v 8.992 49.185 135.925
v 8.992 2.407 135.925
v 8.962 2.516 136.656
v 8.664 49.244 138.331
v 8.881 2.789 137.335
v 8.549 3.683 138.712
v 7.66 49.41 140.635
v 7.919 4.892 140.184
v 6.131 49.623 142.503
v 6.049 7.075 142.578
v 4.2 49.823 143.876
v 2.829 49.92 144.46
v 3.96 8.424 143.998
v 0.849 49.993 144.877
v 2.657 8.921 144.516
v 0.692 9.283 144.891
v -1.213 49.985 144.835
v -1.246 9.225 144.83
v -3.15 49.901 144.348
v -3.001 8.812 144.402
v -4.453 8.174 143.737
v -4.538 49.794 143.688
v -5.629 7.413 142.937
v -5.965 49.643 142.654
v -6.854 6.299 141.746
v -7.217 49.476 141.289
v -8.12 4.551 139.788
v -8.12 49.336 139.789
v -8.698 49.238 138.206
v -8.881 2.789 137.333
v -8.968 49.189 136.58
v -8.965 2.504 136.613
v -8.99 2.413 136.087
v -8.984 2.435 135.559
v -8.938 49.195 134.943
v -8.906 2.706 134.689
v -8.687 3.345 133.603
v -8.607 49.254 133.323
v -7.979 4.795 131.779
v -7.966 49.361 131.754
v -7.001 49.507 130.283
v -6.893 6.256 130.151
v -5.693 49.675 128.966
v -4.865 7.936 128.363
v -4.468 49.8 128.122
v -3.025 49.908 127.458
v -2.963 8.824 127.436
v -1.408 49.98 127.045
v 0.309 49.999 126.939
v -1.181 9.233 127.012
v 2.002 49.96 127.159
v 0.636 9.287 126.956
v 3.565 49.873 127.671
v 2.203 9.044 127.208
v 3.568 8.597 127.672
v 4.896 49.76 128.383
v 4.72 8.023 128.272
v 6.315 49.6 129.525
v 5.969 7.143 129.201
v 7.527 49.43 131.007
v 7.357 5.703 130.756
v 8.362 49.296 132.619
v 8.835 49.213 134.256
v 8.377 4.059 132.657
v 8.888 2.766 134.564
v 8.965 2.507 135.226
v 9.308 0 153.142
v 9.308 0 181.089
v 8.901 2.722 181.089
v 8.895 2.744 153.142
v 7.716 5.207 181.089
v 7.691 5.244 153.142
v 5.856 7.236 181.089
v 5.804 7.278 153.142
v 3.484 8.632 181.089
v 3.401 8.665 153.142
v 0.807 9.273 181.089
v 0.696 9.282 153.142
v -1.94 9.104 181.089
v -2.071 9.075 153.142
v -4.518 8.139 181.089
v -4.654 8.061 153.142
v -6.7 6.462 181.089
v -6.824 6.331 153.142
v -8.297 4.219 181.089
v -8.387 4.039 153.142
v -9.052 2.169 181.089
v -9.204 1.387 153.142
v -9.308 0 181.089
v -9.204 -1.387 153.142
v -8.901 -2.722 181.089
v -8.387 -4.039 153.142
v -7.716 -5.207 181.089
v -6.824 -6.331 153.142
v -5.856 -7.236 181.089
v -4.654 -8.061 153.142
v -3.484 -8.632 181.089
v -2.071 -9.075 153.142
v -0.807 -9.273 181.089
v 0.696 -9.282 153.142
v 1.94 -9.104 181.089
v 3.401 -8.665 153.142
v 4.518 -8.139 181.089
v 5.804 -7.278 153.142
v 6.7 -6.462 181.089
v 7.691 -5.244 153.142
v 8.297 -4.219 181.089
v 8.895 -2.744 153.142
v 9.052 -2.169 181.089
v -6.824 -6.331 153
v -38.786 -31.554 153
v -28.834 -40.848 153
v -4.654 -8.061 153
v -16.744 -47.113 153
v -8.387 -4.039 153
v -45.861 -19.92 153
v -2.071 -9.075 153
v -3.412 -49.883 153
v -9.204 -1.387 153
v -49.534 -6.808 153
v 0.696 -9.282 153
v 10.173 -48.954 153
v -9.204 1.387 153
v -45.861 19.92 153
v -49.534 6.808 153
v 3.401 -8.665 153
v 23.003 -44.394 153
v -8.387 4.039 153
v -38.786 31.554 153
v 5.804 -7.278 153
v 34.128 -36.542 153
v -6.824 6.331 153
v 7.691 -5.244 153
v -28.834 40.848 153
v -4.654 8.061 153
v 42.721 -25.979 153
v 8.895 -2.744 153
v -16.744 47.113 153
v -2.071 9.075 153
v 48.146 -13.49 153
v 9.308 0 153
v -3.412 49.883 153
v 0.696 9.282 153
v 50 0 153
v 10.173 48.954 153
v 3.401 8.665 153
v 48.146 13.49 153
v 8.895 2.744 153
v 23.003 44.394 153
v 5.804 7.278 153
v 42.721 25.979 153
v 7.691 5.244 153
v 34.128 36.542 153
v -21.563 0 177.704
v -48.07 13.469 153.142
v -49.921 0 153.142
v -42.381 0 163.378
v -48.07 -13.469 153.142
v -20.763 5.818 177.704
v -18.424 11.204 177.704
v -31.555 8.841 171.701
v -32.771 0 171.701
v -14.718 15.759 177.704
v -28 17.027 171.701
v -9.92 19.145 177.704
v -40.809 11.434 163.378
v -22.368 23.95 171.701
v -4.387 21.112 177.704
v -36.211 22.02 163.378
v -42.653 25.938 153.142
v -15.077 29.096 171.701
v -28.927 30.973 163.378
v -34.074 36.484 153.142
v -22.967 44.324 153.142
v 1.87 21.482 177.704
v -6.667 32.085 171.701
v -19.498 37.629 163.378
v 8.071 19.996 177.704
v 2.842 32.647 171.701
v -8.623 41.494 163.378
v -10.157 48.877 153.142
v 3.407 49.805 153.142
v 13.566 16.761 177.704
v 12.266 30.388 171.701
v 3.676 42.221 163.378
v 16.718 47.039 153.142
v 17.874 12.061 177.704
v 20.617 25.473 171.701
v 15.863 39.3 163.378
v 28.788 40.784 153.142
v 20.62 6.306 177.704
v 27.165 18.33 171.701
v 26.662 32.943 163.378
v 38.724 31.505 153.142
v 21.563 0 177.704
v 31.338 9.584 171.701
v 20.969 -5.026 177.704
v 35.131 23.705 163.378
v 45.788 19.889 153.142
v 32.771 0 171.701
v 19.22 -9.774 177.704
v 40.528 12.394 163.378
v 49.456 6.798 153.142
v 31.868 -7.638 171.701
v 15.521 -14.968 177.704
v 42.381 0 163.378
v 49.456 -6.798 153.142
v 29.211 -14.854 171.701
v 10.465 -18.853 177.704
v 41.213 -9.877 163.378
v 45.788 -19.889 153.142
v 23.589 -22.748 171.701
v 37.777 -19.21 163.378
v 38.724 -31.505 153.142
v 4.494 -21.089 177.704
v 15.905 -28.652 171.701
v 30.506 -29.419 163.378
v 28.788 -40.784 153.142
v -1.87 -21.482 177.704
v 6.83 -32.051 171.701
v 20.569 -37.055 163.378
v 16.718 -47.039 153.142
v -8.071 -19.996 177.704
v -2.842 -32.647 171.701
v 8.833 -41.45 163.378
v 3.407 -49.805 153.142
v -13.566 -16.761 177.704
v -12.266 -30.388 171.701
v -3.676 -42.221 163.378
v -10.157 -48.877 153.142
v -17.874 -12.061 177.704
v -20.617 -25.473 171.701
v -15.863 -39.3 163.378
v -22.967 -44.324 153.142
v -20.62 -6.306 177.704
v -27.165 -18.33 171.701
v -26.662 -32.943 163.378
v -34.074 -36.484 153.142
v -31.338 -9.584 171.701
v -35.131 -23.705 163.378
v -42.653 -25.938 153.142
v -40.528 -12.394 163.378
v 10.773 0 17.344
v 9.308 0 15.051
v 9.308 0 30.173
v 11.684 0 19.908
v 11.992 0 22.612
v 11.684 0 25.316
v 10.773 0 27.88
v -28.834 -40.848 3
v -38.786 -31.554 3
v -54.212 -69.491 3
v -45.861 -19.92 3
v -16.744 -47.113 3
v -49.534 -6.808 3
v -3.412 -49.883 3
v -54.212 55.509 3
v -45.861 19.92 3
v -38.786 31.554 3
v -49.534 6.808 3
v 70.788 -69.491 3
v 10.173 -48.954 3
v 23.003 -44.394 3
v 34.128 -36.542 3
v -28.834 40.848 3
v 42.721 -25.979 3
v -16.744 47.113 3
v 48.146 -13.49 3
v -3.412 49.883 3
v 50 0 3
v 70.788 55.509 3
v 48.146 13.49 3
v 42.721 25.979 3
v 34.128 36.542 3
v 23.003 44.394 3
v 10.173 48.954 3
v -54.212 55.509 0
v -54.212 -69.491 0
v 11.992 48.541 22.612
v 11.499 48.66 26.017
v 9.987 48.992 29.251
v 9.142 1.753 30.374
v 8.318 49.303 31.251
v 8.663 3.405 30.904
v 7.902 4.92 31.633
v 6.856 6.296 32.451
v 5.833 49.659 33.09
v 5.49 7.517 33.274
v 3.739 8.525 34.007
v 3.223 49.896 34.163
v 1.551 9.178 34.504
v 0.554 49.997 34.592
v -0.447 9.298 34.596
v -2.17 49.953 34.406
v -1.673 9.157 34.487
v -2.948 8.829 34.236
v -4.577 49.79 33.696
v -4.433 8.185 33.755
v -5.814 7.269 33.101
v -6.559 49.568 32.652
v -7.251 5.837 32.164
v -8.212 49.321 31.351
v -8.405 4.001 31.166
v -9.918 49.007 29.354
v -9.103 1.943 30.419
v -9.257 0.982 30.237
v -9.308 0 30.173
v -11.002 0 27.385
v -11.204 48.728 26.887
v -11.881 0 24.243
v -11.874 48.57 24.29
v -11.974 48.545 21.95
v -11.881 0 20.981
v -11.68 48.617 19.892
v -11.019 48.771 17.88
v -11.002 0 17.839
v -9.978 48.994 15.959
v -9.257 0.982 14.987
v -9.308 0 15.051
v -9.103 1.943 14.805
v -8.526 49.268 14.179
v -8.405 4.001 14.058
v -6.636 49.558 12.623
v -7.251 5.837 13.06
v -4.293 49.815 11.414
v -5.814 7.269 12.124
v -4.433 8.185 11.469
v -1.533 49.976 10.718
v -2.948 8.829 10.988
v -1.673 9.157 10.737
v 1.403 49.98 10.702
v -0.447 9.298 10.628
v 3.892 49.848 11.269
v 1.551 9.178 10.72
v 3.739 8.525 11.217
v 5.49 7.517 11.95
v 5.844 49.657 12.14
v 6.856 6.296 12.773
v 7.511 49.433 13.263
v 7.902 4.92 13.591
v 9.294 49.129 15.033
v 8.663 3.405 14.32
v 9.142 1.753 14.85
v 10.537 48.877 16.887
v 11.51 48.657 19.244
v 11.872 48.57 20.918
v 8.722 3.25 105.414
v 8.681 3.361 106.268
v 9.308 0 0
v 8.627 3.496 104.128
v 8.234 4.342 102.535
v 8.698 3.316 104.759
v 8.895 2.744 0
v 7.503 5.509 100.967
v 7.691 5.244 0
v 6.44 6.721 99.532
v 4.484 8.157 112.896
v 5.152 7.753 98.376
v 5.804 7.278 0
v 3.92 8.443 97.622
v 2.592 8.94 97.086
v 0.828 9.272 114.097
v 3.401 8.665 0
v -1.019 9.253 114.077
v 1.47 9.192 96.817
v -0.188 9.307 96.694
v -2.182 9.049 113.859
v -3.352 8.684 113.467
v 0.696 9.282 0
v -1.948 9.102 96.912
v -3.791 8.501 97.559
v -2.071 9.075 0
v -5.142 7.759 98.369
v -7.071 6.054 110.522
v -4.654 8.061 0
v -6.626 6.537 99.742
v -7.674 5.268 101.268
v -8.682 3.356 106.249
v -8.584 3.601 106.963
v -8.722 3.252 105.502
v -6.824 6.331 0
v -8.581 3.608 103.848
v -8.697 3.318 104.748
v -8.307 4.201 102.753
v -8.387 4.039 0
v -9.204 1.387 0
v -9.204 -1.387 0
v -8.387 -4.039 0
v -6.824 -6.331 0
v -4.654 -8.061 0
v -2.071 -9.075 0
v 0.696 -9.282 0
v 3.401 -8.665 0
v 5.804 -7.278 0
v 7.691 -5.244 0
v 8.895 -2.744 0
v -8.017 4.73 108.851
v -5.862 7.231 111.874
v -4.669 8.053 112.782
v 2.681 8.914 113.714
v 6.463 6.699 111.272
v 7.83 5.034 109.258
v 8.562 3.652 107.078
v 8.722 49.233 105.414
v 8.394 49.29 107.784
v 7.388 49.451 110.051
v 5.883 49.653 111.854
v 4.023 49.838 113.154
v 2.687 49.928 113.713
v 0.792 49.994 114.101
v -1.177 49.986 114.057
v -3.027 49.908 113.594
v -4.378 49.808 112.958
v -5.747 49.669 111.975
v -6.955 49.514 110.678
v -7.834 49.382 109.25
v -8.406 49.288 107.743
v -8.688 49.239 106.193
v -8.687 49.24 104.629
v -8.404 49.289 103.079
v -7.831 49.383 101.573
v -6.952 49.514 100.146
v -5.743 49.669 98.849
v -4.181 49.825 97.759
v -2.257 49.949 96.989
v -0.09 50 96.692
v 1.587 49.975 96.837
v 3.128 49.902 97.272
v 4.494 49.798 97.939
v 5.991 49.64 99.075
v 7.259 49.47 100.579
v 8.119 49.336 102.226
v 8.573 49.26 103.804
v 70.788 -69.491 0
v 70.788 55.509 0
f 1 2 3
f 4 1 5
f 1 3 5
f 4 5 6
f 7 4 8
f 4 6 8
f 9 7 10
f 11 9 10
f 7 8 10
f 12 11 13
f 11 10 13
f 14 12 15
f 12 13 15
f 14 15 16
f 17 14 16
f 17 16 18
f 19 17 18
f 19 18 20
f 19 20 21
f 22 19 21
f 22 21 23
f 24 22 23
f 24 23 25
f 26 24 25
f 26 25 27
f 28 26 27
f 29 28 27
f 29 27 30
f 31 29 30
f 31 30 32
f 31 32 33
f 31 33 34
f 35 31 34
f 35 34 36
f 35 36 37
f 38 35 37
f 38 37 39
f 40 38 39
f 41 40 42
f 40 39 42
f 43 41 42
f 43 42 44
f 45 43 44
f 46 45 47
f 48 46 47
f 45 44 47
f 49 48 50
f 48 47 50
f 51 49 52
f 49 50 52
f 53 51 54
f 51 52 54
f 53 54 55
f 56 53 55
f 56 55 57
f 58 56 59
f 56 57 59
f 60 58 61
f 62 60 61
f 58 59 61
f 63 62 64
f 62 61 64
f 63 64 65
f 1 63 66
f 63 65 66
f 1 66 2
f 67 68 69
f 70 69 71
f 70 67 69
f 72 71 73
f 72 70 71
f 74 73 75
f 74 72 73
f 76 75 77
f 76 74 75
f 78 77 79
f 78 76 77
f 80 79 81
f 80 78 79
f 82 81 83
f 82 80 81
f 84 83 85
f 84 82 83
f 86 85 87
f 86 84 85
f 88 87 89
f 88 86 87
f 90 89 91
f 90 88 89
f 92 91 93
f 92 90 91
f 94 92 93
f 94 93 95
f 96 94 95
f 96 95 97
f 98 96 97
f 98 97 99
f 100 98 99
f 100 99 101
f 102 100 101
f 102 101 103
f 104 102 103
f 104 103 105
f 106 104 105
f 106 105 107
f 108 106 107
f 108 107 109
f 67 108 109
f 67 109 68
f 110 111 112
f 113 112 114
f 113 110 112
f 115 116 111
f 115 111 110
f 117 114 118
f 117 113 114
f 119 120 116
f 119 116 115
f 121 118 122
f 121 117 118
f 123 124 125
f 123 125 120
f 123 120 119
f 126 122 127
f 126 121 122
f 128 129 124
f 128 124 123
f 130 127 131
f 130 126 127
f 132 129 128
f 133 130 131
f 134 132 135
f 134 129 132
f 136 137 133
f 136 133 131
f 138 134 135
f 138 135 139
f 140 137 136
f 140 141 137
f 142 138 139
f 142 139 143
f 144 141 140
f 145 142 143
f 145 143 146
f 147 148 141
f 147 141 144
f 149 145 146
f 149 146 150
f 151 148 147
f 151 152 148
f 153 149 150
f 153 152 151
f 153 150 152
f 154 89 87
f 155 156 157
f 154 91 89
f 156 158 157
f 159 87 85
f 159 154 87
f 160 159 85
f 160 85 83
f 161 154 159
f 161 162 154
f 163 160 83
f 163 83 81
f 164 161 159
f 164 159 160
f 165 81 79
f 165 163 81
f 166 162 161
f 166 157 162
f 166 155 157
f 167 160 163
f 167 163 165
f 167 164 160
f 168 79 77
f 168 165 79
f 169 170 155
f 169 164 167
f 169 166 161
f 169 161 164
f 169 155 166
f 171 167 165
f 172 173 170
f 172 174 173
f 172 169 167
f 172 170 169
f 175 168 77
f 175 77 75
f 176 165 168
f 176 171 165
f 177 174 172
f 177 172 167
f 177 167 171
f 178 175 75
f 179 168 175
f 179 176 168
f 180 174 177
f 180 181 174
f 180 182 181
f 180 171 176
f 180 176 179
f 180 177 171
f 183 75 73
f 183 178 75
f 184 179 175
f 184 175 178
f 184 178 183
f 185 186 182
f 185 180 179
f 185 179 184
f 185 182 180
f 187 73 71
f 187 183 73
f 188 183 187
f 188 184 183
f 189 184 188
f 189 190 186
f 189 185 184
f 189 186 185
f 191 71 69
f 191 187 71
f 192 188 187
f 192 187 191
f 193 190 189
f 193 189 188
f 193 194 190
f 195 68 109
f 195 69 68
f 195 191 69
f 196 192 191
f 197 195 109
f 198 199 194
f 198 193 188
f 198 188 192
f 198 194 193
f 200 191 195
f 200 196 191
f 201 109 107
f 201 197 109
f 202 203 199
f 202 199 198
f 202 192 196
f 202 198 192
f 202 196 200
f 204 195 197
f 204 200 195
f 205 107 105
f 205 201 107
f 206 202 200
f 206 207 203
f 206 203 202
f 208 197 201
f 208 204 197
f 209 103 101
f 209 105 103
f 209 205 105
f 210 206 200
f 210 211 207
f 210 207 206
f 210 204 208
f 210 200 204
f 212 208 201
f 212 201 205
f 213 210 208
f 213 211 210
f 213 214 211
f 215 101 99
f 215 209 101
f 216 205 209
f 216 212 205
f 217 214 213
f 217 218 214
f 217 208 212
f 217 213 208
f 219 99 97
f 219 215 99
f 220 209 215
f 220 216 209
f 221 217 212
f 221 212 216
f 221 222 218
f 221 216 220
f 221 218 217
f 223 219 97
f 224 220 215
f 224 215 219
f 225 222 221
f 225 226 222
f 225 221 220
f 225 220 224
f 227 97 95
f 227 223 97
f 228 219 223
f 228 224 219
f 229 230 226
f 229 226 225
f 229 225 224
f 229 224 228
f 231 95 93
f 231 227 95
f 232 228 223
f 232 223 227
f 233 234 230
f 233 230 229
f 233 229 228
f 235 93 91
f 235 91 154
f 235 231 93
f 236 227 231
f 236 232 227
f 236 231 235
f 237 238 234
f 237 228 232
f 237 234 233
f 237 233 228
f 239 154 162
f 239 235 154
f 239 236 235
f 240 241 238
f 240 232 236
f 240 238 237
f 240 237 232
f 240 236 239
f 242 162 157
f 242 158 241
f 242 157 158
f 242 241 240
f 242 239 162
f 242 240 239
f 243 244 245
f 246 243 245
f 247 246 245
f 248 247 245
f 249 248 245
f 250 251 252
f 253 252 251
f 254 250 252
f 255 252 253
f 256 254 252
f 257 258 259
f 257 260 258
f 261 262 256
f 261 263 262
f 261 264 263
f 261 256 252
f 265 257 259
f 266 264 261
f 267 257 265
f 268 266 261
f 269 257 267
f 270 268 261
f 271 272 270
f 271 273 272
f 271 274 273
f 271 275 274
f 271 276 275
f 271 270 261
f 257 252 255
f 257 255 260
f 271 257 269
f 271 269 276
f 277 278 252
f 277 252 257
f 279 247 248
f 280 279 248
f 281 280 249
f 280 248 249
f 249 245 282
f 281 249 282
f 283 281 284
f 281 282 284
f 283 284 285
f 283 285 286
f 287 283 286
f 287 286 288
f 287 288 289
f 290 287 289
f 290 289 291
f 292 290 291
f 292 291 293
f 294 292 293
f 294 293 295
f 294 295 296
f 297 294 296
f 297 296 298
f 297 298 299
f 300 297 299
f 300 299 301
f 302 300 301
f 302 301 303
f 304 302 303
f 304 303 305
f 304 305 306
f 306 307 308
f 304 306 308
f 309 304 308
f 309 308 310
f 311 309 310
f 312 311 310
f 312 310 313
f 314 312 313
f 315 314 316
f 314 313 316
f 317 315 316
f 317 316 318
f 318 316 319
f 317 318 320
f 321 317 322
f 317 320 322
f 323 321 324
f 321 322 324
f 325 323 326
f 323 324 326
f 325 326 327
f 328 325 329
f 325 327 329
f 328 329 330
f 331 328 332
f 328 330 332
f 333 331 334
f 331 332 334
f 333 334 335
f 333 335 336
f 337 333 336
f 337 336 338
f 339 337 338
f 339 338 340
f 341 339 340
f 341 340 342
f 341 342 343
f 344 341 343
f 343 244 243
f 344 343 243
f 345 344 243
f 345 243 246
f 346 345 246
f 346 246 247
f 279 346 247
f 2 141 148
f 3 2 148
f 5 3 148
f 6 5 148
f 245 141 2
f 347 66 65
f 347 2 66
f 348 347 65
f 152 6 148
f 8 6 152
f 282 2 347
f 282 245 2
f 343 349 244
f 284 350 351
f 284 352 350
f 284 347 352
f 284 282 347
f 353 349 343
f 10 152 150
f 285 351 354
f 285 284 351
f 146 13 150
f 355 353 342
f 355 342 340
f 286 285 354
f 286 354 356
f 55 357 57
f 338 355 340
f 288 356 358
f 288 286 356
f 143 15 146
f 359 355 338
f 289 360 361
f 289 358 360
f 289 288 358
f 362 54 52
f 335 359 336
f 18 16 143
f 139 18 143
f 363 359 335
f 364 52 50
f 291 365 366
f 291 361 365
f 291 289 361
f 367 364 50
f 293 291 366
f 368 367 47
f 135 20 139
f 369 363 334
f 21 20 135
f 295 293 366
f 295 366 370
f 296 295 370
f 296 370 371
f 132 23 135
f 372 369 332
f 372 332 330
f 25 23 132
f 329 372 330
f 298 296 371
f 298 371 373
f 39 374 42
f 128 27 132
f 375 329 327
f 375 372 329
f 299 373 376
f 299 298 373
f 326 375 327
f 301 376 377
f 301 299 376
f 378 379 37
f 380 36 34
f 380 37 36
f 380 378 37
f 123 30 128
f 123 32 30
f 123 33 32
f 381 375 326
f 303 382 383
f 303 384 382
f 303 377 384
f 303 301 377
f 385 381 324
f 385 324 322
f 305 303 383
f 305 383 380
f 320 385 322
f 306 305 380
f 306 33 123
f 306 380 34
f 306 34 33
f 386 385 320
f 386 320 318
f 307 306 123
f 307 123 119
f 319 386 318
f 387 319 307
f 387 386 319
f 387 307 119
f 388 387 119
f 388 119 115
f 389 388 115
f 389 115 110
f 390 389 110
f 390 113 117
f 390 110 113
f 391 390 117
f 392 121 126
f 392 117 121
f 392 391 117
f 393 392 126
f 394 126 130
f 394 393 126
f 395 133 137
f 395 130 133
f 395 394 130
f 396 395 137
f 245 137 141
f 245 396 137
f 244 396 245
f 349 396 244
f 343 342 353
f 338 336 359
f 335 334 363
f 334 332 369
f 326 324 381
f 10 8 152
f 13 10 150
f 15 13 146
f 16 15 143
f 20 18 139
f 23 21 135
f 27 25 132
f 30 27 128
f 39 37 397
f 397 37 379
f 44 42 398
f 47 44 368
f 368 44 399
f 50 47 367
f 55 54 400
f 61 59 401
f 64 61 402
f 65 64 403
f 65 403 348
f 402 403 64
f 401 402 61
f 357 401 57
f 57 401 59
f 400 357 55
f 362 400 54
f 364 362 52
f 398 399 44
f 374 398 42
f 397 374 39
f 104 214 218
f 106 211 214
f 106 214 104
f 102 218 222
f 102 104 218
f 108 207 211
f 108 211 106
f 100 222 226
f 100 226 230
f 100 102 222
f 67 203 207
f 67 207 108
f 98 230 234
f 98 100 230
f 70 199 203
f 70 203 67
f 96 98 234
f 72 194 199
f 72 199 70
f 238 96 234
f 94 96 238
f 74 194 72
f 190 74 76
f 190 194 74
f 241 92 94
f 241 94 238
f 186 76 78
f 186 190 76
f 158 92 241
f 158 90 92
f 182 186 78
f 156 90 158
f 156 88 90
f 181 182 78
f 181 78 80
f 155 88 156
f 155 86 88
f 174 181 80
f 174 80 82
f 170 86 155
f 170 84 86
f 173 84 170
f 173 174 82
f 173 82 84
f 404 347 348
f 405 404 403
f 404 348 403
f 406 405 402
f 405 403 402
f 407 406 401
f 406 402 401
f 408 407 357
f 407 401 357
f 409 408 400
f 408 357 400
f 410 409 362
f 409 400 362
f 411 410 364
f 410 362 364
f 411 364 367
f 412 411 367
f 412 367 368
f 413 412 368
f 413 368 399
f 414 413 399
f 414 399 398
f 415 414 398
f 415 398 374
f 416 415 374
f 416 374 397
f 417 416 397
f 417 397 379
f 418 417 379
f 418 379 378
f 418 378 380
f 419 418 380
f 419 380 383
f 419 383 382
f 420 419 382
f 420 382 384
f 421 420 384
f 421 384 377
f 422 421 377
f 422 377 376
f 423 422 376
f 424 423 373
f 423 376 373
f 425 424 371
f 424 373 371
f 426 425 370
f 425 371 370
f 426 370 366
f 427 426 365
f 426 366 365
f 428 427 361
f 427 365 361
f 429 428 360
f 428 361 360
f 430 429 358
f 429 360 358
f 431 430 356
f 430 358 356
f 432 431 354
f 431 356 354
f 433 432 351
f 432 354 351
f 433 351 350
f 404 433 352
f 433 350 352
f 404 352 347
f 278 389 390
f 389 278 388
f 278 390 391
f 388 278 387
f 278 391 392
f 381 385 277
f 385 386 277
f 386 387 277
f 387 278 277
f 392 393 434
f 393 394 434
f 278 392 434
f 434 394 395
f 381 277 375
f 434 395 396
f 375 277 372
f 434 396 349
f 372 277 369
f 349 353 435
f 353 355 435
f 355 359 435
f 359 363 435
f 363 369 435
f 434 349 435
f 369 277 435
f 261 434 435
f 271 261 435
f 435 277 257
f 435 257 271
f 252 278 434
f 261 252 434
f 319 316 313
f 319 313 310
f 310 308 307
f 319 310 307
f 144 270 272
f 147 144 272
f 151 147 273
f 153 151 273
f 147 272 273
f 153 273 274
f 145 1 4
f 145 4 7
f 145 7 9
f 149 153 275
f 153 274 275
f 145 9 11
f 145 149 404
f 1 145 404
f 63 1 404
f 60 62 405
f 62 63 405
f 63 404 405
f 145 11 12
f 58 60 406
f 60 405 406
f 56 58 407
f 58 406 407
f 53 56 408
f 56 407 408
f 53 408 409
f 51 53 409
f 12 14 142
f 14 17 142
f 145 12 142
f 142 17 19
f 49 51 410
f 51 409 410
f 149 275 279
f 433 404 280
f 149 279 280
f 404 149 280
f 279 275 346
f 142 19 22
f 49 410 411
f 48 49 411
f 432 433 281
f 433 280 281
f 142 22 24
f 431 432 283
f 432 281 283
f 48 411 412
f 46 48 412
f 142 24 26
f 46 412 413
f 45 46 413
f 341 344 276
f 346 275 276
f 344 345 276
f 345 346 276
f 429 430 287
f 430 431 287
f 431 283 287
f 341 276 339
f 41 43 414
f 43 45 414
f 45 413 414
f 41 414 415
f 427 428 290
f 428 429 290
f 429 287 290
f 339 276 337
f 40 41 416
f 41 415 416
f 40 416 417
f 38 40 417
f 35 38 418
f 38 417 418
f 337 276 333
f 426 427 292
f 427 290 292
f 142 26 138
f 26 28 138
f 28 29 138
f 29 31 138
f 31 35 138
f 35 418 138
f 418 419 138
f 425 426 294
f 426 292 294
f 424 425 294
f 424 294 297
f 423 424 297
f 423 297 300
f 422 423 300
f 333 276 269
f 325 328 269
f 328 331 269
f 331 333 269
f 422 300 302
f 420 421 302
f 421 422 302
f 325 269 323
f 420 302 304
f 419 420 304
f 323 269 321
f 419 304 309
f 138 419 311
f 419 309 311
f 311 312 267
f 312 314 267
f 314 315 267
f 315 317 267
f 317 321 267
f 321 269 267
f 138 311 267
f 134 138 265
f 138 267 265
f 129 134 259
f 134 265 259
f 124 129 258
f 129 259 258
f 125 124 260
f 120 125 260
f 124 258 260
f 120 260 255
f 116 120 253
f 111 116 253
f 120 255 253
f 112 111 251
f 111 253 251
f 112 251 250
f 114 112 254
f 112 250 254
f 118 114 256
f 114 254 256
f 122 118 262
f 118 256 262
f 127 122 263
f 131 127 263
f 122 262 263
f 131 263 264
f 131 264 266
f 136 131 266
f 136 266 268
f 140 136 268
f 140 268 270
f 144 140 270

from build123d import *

# Parameters (mm, degrees)
F0_W     = 125
F0_H     = 125
F1_DEPTH = 3
F2_R     = 50
F3_DEPTH = 150
F6_R     = 11.992359
F6_R_2   = 8.991762
F6_R_3   = 8.722489
F7_DEPTH = 76.2
F8_R     = 9.308466
F9_DEPTH = 181.809588


with BuildPart() as f1:
    # F0 (on Top) → F1 (new body)
    with BuildSketch(Plane.XY):
        with Locations((8.287821, -6.991455)):
            Rectangle(F0_W, F0_H)
    extrude(amount=F1_DEPTH)

    # F2 (on face) → F3 (join)
    with BuildSketch(Plane.XY.offset(3)):
        Circle(F2_R)
    extrude(amount=F3_DEPTH)

    # F6 (on Front) → F7 (cut)
    with BuildSketch(Plane.XZ):
        with Locations((0, 22.612009)):
            Circle(F6_R)
        with Locations((0, 135.925442)):
            Circle(F6_R_2)
        with Locations((0, 105.414167)):
            Circle(F6_R_3)
    extrude(amount=-F7_DEPTH, mode=Mode.SUBTRACT)


with BuildPart() as f5:
    # F4 (on Front) → F5 (revolve)
    with BuildSketch(Plane.XZ):
        with BuildLine():
            ThreePointArc((0, 181.808025), (-28.817127, 174.19098), (-49.920975, 153.141662))
            Line((-49.920975, 153.141662), (0, 153.141662))
            Line((0, 153.141662), (0, 181.808025))
        make_face()
    revolve(axis=Axis((0, 0, 135.424778), (0, 0, -1)))


with BuildPart() as f9_tool:
    # F8 (on Top) → F9 (new body, through all)
    with BuildSketch(Plane.XY):
        Circle(F8_R)
    extrude(amount=F9_DEPTH)


with BuildPart() as f1_1:
    add(f1.part)

    # F9: cut by f9_tool
    add(f9_tool.part, mode=Mode.SUBTRACT)


with BuildPart() as f5_1:
    add(f5.part)

    # F9: cut by f9_tool
    add(f9_tool.part, mode=Mode.SUBTRACT)


solid = Compound([f1_1.part, f5_1.part])
